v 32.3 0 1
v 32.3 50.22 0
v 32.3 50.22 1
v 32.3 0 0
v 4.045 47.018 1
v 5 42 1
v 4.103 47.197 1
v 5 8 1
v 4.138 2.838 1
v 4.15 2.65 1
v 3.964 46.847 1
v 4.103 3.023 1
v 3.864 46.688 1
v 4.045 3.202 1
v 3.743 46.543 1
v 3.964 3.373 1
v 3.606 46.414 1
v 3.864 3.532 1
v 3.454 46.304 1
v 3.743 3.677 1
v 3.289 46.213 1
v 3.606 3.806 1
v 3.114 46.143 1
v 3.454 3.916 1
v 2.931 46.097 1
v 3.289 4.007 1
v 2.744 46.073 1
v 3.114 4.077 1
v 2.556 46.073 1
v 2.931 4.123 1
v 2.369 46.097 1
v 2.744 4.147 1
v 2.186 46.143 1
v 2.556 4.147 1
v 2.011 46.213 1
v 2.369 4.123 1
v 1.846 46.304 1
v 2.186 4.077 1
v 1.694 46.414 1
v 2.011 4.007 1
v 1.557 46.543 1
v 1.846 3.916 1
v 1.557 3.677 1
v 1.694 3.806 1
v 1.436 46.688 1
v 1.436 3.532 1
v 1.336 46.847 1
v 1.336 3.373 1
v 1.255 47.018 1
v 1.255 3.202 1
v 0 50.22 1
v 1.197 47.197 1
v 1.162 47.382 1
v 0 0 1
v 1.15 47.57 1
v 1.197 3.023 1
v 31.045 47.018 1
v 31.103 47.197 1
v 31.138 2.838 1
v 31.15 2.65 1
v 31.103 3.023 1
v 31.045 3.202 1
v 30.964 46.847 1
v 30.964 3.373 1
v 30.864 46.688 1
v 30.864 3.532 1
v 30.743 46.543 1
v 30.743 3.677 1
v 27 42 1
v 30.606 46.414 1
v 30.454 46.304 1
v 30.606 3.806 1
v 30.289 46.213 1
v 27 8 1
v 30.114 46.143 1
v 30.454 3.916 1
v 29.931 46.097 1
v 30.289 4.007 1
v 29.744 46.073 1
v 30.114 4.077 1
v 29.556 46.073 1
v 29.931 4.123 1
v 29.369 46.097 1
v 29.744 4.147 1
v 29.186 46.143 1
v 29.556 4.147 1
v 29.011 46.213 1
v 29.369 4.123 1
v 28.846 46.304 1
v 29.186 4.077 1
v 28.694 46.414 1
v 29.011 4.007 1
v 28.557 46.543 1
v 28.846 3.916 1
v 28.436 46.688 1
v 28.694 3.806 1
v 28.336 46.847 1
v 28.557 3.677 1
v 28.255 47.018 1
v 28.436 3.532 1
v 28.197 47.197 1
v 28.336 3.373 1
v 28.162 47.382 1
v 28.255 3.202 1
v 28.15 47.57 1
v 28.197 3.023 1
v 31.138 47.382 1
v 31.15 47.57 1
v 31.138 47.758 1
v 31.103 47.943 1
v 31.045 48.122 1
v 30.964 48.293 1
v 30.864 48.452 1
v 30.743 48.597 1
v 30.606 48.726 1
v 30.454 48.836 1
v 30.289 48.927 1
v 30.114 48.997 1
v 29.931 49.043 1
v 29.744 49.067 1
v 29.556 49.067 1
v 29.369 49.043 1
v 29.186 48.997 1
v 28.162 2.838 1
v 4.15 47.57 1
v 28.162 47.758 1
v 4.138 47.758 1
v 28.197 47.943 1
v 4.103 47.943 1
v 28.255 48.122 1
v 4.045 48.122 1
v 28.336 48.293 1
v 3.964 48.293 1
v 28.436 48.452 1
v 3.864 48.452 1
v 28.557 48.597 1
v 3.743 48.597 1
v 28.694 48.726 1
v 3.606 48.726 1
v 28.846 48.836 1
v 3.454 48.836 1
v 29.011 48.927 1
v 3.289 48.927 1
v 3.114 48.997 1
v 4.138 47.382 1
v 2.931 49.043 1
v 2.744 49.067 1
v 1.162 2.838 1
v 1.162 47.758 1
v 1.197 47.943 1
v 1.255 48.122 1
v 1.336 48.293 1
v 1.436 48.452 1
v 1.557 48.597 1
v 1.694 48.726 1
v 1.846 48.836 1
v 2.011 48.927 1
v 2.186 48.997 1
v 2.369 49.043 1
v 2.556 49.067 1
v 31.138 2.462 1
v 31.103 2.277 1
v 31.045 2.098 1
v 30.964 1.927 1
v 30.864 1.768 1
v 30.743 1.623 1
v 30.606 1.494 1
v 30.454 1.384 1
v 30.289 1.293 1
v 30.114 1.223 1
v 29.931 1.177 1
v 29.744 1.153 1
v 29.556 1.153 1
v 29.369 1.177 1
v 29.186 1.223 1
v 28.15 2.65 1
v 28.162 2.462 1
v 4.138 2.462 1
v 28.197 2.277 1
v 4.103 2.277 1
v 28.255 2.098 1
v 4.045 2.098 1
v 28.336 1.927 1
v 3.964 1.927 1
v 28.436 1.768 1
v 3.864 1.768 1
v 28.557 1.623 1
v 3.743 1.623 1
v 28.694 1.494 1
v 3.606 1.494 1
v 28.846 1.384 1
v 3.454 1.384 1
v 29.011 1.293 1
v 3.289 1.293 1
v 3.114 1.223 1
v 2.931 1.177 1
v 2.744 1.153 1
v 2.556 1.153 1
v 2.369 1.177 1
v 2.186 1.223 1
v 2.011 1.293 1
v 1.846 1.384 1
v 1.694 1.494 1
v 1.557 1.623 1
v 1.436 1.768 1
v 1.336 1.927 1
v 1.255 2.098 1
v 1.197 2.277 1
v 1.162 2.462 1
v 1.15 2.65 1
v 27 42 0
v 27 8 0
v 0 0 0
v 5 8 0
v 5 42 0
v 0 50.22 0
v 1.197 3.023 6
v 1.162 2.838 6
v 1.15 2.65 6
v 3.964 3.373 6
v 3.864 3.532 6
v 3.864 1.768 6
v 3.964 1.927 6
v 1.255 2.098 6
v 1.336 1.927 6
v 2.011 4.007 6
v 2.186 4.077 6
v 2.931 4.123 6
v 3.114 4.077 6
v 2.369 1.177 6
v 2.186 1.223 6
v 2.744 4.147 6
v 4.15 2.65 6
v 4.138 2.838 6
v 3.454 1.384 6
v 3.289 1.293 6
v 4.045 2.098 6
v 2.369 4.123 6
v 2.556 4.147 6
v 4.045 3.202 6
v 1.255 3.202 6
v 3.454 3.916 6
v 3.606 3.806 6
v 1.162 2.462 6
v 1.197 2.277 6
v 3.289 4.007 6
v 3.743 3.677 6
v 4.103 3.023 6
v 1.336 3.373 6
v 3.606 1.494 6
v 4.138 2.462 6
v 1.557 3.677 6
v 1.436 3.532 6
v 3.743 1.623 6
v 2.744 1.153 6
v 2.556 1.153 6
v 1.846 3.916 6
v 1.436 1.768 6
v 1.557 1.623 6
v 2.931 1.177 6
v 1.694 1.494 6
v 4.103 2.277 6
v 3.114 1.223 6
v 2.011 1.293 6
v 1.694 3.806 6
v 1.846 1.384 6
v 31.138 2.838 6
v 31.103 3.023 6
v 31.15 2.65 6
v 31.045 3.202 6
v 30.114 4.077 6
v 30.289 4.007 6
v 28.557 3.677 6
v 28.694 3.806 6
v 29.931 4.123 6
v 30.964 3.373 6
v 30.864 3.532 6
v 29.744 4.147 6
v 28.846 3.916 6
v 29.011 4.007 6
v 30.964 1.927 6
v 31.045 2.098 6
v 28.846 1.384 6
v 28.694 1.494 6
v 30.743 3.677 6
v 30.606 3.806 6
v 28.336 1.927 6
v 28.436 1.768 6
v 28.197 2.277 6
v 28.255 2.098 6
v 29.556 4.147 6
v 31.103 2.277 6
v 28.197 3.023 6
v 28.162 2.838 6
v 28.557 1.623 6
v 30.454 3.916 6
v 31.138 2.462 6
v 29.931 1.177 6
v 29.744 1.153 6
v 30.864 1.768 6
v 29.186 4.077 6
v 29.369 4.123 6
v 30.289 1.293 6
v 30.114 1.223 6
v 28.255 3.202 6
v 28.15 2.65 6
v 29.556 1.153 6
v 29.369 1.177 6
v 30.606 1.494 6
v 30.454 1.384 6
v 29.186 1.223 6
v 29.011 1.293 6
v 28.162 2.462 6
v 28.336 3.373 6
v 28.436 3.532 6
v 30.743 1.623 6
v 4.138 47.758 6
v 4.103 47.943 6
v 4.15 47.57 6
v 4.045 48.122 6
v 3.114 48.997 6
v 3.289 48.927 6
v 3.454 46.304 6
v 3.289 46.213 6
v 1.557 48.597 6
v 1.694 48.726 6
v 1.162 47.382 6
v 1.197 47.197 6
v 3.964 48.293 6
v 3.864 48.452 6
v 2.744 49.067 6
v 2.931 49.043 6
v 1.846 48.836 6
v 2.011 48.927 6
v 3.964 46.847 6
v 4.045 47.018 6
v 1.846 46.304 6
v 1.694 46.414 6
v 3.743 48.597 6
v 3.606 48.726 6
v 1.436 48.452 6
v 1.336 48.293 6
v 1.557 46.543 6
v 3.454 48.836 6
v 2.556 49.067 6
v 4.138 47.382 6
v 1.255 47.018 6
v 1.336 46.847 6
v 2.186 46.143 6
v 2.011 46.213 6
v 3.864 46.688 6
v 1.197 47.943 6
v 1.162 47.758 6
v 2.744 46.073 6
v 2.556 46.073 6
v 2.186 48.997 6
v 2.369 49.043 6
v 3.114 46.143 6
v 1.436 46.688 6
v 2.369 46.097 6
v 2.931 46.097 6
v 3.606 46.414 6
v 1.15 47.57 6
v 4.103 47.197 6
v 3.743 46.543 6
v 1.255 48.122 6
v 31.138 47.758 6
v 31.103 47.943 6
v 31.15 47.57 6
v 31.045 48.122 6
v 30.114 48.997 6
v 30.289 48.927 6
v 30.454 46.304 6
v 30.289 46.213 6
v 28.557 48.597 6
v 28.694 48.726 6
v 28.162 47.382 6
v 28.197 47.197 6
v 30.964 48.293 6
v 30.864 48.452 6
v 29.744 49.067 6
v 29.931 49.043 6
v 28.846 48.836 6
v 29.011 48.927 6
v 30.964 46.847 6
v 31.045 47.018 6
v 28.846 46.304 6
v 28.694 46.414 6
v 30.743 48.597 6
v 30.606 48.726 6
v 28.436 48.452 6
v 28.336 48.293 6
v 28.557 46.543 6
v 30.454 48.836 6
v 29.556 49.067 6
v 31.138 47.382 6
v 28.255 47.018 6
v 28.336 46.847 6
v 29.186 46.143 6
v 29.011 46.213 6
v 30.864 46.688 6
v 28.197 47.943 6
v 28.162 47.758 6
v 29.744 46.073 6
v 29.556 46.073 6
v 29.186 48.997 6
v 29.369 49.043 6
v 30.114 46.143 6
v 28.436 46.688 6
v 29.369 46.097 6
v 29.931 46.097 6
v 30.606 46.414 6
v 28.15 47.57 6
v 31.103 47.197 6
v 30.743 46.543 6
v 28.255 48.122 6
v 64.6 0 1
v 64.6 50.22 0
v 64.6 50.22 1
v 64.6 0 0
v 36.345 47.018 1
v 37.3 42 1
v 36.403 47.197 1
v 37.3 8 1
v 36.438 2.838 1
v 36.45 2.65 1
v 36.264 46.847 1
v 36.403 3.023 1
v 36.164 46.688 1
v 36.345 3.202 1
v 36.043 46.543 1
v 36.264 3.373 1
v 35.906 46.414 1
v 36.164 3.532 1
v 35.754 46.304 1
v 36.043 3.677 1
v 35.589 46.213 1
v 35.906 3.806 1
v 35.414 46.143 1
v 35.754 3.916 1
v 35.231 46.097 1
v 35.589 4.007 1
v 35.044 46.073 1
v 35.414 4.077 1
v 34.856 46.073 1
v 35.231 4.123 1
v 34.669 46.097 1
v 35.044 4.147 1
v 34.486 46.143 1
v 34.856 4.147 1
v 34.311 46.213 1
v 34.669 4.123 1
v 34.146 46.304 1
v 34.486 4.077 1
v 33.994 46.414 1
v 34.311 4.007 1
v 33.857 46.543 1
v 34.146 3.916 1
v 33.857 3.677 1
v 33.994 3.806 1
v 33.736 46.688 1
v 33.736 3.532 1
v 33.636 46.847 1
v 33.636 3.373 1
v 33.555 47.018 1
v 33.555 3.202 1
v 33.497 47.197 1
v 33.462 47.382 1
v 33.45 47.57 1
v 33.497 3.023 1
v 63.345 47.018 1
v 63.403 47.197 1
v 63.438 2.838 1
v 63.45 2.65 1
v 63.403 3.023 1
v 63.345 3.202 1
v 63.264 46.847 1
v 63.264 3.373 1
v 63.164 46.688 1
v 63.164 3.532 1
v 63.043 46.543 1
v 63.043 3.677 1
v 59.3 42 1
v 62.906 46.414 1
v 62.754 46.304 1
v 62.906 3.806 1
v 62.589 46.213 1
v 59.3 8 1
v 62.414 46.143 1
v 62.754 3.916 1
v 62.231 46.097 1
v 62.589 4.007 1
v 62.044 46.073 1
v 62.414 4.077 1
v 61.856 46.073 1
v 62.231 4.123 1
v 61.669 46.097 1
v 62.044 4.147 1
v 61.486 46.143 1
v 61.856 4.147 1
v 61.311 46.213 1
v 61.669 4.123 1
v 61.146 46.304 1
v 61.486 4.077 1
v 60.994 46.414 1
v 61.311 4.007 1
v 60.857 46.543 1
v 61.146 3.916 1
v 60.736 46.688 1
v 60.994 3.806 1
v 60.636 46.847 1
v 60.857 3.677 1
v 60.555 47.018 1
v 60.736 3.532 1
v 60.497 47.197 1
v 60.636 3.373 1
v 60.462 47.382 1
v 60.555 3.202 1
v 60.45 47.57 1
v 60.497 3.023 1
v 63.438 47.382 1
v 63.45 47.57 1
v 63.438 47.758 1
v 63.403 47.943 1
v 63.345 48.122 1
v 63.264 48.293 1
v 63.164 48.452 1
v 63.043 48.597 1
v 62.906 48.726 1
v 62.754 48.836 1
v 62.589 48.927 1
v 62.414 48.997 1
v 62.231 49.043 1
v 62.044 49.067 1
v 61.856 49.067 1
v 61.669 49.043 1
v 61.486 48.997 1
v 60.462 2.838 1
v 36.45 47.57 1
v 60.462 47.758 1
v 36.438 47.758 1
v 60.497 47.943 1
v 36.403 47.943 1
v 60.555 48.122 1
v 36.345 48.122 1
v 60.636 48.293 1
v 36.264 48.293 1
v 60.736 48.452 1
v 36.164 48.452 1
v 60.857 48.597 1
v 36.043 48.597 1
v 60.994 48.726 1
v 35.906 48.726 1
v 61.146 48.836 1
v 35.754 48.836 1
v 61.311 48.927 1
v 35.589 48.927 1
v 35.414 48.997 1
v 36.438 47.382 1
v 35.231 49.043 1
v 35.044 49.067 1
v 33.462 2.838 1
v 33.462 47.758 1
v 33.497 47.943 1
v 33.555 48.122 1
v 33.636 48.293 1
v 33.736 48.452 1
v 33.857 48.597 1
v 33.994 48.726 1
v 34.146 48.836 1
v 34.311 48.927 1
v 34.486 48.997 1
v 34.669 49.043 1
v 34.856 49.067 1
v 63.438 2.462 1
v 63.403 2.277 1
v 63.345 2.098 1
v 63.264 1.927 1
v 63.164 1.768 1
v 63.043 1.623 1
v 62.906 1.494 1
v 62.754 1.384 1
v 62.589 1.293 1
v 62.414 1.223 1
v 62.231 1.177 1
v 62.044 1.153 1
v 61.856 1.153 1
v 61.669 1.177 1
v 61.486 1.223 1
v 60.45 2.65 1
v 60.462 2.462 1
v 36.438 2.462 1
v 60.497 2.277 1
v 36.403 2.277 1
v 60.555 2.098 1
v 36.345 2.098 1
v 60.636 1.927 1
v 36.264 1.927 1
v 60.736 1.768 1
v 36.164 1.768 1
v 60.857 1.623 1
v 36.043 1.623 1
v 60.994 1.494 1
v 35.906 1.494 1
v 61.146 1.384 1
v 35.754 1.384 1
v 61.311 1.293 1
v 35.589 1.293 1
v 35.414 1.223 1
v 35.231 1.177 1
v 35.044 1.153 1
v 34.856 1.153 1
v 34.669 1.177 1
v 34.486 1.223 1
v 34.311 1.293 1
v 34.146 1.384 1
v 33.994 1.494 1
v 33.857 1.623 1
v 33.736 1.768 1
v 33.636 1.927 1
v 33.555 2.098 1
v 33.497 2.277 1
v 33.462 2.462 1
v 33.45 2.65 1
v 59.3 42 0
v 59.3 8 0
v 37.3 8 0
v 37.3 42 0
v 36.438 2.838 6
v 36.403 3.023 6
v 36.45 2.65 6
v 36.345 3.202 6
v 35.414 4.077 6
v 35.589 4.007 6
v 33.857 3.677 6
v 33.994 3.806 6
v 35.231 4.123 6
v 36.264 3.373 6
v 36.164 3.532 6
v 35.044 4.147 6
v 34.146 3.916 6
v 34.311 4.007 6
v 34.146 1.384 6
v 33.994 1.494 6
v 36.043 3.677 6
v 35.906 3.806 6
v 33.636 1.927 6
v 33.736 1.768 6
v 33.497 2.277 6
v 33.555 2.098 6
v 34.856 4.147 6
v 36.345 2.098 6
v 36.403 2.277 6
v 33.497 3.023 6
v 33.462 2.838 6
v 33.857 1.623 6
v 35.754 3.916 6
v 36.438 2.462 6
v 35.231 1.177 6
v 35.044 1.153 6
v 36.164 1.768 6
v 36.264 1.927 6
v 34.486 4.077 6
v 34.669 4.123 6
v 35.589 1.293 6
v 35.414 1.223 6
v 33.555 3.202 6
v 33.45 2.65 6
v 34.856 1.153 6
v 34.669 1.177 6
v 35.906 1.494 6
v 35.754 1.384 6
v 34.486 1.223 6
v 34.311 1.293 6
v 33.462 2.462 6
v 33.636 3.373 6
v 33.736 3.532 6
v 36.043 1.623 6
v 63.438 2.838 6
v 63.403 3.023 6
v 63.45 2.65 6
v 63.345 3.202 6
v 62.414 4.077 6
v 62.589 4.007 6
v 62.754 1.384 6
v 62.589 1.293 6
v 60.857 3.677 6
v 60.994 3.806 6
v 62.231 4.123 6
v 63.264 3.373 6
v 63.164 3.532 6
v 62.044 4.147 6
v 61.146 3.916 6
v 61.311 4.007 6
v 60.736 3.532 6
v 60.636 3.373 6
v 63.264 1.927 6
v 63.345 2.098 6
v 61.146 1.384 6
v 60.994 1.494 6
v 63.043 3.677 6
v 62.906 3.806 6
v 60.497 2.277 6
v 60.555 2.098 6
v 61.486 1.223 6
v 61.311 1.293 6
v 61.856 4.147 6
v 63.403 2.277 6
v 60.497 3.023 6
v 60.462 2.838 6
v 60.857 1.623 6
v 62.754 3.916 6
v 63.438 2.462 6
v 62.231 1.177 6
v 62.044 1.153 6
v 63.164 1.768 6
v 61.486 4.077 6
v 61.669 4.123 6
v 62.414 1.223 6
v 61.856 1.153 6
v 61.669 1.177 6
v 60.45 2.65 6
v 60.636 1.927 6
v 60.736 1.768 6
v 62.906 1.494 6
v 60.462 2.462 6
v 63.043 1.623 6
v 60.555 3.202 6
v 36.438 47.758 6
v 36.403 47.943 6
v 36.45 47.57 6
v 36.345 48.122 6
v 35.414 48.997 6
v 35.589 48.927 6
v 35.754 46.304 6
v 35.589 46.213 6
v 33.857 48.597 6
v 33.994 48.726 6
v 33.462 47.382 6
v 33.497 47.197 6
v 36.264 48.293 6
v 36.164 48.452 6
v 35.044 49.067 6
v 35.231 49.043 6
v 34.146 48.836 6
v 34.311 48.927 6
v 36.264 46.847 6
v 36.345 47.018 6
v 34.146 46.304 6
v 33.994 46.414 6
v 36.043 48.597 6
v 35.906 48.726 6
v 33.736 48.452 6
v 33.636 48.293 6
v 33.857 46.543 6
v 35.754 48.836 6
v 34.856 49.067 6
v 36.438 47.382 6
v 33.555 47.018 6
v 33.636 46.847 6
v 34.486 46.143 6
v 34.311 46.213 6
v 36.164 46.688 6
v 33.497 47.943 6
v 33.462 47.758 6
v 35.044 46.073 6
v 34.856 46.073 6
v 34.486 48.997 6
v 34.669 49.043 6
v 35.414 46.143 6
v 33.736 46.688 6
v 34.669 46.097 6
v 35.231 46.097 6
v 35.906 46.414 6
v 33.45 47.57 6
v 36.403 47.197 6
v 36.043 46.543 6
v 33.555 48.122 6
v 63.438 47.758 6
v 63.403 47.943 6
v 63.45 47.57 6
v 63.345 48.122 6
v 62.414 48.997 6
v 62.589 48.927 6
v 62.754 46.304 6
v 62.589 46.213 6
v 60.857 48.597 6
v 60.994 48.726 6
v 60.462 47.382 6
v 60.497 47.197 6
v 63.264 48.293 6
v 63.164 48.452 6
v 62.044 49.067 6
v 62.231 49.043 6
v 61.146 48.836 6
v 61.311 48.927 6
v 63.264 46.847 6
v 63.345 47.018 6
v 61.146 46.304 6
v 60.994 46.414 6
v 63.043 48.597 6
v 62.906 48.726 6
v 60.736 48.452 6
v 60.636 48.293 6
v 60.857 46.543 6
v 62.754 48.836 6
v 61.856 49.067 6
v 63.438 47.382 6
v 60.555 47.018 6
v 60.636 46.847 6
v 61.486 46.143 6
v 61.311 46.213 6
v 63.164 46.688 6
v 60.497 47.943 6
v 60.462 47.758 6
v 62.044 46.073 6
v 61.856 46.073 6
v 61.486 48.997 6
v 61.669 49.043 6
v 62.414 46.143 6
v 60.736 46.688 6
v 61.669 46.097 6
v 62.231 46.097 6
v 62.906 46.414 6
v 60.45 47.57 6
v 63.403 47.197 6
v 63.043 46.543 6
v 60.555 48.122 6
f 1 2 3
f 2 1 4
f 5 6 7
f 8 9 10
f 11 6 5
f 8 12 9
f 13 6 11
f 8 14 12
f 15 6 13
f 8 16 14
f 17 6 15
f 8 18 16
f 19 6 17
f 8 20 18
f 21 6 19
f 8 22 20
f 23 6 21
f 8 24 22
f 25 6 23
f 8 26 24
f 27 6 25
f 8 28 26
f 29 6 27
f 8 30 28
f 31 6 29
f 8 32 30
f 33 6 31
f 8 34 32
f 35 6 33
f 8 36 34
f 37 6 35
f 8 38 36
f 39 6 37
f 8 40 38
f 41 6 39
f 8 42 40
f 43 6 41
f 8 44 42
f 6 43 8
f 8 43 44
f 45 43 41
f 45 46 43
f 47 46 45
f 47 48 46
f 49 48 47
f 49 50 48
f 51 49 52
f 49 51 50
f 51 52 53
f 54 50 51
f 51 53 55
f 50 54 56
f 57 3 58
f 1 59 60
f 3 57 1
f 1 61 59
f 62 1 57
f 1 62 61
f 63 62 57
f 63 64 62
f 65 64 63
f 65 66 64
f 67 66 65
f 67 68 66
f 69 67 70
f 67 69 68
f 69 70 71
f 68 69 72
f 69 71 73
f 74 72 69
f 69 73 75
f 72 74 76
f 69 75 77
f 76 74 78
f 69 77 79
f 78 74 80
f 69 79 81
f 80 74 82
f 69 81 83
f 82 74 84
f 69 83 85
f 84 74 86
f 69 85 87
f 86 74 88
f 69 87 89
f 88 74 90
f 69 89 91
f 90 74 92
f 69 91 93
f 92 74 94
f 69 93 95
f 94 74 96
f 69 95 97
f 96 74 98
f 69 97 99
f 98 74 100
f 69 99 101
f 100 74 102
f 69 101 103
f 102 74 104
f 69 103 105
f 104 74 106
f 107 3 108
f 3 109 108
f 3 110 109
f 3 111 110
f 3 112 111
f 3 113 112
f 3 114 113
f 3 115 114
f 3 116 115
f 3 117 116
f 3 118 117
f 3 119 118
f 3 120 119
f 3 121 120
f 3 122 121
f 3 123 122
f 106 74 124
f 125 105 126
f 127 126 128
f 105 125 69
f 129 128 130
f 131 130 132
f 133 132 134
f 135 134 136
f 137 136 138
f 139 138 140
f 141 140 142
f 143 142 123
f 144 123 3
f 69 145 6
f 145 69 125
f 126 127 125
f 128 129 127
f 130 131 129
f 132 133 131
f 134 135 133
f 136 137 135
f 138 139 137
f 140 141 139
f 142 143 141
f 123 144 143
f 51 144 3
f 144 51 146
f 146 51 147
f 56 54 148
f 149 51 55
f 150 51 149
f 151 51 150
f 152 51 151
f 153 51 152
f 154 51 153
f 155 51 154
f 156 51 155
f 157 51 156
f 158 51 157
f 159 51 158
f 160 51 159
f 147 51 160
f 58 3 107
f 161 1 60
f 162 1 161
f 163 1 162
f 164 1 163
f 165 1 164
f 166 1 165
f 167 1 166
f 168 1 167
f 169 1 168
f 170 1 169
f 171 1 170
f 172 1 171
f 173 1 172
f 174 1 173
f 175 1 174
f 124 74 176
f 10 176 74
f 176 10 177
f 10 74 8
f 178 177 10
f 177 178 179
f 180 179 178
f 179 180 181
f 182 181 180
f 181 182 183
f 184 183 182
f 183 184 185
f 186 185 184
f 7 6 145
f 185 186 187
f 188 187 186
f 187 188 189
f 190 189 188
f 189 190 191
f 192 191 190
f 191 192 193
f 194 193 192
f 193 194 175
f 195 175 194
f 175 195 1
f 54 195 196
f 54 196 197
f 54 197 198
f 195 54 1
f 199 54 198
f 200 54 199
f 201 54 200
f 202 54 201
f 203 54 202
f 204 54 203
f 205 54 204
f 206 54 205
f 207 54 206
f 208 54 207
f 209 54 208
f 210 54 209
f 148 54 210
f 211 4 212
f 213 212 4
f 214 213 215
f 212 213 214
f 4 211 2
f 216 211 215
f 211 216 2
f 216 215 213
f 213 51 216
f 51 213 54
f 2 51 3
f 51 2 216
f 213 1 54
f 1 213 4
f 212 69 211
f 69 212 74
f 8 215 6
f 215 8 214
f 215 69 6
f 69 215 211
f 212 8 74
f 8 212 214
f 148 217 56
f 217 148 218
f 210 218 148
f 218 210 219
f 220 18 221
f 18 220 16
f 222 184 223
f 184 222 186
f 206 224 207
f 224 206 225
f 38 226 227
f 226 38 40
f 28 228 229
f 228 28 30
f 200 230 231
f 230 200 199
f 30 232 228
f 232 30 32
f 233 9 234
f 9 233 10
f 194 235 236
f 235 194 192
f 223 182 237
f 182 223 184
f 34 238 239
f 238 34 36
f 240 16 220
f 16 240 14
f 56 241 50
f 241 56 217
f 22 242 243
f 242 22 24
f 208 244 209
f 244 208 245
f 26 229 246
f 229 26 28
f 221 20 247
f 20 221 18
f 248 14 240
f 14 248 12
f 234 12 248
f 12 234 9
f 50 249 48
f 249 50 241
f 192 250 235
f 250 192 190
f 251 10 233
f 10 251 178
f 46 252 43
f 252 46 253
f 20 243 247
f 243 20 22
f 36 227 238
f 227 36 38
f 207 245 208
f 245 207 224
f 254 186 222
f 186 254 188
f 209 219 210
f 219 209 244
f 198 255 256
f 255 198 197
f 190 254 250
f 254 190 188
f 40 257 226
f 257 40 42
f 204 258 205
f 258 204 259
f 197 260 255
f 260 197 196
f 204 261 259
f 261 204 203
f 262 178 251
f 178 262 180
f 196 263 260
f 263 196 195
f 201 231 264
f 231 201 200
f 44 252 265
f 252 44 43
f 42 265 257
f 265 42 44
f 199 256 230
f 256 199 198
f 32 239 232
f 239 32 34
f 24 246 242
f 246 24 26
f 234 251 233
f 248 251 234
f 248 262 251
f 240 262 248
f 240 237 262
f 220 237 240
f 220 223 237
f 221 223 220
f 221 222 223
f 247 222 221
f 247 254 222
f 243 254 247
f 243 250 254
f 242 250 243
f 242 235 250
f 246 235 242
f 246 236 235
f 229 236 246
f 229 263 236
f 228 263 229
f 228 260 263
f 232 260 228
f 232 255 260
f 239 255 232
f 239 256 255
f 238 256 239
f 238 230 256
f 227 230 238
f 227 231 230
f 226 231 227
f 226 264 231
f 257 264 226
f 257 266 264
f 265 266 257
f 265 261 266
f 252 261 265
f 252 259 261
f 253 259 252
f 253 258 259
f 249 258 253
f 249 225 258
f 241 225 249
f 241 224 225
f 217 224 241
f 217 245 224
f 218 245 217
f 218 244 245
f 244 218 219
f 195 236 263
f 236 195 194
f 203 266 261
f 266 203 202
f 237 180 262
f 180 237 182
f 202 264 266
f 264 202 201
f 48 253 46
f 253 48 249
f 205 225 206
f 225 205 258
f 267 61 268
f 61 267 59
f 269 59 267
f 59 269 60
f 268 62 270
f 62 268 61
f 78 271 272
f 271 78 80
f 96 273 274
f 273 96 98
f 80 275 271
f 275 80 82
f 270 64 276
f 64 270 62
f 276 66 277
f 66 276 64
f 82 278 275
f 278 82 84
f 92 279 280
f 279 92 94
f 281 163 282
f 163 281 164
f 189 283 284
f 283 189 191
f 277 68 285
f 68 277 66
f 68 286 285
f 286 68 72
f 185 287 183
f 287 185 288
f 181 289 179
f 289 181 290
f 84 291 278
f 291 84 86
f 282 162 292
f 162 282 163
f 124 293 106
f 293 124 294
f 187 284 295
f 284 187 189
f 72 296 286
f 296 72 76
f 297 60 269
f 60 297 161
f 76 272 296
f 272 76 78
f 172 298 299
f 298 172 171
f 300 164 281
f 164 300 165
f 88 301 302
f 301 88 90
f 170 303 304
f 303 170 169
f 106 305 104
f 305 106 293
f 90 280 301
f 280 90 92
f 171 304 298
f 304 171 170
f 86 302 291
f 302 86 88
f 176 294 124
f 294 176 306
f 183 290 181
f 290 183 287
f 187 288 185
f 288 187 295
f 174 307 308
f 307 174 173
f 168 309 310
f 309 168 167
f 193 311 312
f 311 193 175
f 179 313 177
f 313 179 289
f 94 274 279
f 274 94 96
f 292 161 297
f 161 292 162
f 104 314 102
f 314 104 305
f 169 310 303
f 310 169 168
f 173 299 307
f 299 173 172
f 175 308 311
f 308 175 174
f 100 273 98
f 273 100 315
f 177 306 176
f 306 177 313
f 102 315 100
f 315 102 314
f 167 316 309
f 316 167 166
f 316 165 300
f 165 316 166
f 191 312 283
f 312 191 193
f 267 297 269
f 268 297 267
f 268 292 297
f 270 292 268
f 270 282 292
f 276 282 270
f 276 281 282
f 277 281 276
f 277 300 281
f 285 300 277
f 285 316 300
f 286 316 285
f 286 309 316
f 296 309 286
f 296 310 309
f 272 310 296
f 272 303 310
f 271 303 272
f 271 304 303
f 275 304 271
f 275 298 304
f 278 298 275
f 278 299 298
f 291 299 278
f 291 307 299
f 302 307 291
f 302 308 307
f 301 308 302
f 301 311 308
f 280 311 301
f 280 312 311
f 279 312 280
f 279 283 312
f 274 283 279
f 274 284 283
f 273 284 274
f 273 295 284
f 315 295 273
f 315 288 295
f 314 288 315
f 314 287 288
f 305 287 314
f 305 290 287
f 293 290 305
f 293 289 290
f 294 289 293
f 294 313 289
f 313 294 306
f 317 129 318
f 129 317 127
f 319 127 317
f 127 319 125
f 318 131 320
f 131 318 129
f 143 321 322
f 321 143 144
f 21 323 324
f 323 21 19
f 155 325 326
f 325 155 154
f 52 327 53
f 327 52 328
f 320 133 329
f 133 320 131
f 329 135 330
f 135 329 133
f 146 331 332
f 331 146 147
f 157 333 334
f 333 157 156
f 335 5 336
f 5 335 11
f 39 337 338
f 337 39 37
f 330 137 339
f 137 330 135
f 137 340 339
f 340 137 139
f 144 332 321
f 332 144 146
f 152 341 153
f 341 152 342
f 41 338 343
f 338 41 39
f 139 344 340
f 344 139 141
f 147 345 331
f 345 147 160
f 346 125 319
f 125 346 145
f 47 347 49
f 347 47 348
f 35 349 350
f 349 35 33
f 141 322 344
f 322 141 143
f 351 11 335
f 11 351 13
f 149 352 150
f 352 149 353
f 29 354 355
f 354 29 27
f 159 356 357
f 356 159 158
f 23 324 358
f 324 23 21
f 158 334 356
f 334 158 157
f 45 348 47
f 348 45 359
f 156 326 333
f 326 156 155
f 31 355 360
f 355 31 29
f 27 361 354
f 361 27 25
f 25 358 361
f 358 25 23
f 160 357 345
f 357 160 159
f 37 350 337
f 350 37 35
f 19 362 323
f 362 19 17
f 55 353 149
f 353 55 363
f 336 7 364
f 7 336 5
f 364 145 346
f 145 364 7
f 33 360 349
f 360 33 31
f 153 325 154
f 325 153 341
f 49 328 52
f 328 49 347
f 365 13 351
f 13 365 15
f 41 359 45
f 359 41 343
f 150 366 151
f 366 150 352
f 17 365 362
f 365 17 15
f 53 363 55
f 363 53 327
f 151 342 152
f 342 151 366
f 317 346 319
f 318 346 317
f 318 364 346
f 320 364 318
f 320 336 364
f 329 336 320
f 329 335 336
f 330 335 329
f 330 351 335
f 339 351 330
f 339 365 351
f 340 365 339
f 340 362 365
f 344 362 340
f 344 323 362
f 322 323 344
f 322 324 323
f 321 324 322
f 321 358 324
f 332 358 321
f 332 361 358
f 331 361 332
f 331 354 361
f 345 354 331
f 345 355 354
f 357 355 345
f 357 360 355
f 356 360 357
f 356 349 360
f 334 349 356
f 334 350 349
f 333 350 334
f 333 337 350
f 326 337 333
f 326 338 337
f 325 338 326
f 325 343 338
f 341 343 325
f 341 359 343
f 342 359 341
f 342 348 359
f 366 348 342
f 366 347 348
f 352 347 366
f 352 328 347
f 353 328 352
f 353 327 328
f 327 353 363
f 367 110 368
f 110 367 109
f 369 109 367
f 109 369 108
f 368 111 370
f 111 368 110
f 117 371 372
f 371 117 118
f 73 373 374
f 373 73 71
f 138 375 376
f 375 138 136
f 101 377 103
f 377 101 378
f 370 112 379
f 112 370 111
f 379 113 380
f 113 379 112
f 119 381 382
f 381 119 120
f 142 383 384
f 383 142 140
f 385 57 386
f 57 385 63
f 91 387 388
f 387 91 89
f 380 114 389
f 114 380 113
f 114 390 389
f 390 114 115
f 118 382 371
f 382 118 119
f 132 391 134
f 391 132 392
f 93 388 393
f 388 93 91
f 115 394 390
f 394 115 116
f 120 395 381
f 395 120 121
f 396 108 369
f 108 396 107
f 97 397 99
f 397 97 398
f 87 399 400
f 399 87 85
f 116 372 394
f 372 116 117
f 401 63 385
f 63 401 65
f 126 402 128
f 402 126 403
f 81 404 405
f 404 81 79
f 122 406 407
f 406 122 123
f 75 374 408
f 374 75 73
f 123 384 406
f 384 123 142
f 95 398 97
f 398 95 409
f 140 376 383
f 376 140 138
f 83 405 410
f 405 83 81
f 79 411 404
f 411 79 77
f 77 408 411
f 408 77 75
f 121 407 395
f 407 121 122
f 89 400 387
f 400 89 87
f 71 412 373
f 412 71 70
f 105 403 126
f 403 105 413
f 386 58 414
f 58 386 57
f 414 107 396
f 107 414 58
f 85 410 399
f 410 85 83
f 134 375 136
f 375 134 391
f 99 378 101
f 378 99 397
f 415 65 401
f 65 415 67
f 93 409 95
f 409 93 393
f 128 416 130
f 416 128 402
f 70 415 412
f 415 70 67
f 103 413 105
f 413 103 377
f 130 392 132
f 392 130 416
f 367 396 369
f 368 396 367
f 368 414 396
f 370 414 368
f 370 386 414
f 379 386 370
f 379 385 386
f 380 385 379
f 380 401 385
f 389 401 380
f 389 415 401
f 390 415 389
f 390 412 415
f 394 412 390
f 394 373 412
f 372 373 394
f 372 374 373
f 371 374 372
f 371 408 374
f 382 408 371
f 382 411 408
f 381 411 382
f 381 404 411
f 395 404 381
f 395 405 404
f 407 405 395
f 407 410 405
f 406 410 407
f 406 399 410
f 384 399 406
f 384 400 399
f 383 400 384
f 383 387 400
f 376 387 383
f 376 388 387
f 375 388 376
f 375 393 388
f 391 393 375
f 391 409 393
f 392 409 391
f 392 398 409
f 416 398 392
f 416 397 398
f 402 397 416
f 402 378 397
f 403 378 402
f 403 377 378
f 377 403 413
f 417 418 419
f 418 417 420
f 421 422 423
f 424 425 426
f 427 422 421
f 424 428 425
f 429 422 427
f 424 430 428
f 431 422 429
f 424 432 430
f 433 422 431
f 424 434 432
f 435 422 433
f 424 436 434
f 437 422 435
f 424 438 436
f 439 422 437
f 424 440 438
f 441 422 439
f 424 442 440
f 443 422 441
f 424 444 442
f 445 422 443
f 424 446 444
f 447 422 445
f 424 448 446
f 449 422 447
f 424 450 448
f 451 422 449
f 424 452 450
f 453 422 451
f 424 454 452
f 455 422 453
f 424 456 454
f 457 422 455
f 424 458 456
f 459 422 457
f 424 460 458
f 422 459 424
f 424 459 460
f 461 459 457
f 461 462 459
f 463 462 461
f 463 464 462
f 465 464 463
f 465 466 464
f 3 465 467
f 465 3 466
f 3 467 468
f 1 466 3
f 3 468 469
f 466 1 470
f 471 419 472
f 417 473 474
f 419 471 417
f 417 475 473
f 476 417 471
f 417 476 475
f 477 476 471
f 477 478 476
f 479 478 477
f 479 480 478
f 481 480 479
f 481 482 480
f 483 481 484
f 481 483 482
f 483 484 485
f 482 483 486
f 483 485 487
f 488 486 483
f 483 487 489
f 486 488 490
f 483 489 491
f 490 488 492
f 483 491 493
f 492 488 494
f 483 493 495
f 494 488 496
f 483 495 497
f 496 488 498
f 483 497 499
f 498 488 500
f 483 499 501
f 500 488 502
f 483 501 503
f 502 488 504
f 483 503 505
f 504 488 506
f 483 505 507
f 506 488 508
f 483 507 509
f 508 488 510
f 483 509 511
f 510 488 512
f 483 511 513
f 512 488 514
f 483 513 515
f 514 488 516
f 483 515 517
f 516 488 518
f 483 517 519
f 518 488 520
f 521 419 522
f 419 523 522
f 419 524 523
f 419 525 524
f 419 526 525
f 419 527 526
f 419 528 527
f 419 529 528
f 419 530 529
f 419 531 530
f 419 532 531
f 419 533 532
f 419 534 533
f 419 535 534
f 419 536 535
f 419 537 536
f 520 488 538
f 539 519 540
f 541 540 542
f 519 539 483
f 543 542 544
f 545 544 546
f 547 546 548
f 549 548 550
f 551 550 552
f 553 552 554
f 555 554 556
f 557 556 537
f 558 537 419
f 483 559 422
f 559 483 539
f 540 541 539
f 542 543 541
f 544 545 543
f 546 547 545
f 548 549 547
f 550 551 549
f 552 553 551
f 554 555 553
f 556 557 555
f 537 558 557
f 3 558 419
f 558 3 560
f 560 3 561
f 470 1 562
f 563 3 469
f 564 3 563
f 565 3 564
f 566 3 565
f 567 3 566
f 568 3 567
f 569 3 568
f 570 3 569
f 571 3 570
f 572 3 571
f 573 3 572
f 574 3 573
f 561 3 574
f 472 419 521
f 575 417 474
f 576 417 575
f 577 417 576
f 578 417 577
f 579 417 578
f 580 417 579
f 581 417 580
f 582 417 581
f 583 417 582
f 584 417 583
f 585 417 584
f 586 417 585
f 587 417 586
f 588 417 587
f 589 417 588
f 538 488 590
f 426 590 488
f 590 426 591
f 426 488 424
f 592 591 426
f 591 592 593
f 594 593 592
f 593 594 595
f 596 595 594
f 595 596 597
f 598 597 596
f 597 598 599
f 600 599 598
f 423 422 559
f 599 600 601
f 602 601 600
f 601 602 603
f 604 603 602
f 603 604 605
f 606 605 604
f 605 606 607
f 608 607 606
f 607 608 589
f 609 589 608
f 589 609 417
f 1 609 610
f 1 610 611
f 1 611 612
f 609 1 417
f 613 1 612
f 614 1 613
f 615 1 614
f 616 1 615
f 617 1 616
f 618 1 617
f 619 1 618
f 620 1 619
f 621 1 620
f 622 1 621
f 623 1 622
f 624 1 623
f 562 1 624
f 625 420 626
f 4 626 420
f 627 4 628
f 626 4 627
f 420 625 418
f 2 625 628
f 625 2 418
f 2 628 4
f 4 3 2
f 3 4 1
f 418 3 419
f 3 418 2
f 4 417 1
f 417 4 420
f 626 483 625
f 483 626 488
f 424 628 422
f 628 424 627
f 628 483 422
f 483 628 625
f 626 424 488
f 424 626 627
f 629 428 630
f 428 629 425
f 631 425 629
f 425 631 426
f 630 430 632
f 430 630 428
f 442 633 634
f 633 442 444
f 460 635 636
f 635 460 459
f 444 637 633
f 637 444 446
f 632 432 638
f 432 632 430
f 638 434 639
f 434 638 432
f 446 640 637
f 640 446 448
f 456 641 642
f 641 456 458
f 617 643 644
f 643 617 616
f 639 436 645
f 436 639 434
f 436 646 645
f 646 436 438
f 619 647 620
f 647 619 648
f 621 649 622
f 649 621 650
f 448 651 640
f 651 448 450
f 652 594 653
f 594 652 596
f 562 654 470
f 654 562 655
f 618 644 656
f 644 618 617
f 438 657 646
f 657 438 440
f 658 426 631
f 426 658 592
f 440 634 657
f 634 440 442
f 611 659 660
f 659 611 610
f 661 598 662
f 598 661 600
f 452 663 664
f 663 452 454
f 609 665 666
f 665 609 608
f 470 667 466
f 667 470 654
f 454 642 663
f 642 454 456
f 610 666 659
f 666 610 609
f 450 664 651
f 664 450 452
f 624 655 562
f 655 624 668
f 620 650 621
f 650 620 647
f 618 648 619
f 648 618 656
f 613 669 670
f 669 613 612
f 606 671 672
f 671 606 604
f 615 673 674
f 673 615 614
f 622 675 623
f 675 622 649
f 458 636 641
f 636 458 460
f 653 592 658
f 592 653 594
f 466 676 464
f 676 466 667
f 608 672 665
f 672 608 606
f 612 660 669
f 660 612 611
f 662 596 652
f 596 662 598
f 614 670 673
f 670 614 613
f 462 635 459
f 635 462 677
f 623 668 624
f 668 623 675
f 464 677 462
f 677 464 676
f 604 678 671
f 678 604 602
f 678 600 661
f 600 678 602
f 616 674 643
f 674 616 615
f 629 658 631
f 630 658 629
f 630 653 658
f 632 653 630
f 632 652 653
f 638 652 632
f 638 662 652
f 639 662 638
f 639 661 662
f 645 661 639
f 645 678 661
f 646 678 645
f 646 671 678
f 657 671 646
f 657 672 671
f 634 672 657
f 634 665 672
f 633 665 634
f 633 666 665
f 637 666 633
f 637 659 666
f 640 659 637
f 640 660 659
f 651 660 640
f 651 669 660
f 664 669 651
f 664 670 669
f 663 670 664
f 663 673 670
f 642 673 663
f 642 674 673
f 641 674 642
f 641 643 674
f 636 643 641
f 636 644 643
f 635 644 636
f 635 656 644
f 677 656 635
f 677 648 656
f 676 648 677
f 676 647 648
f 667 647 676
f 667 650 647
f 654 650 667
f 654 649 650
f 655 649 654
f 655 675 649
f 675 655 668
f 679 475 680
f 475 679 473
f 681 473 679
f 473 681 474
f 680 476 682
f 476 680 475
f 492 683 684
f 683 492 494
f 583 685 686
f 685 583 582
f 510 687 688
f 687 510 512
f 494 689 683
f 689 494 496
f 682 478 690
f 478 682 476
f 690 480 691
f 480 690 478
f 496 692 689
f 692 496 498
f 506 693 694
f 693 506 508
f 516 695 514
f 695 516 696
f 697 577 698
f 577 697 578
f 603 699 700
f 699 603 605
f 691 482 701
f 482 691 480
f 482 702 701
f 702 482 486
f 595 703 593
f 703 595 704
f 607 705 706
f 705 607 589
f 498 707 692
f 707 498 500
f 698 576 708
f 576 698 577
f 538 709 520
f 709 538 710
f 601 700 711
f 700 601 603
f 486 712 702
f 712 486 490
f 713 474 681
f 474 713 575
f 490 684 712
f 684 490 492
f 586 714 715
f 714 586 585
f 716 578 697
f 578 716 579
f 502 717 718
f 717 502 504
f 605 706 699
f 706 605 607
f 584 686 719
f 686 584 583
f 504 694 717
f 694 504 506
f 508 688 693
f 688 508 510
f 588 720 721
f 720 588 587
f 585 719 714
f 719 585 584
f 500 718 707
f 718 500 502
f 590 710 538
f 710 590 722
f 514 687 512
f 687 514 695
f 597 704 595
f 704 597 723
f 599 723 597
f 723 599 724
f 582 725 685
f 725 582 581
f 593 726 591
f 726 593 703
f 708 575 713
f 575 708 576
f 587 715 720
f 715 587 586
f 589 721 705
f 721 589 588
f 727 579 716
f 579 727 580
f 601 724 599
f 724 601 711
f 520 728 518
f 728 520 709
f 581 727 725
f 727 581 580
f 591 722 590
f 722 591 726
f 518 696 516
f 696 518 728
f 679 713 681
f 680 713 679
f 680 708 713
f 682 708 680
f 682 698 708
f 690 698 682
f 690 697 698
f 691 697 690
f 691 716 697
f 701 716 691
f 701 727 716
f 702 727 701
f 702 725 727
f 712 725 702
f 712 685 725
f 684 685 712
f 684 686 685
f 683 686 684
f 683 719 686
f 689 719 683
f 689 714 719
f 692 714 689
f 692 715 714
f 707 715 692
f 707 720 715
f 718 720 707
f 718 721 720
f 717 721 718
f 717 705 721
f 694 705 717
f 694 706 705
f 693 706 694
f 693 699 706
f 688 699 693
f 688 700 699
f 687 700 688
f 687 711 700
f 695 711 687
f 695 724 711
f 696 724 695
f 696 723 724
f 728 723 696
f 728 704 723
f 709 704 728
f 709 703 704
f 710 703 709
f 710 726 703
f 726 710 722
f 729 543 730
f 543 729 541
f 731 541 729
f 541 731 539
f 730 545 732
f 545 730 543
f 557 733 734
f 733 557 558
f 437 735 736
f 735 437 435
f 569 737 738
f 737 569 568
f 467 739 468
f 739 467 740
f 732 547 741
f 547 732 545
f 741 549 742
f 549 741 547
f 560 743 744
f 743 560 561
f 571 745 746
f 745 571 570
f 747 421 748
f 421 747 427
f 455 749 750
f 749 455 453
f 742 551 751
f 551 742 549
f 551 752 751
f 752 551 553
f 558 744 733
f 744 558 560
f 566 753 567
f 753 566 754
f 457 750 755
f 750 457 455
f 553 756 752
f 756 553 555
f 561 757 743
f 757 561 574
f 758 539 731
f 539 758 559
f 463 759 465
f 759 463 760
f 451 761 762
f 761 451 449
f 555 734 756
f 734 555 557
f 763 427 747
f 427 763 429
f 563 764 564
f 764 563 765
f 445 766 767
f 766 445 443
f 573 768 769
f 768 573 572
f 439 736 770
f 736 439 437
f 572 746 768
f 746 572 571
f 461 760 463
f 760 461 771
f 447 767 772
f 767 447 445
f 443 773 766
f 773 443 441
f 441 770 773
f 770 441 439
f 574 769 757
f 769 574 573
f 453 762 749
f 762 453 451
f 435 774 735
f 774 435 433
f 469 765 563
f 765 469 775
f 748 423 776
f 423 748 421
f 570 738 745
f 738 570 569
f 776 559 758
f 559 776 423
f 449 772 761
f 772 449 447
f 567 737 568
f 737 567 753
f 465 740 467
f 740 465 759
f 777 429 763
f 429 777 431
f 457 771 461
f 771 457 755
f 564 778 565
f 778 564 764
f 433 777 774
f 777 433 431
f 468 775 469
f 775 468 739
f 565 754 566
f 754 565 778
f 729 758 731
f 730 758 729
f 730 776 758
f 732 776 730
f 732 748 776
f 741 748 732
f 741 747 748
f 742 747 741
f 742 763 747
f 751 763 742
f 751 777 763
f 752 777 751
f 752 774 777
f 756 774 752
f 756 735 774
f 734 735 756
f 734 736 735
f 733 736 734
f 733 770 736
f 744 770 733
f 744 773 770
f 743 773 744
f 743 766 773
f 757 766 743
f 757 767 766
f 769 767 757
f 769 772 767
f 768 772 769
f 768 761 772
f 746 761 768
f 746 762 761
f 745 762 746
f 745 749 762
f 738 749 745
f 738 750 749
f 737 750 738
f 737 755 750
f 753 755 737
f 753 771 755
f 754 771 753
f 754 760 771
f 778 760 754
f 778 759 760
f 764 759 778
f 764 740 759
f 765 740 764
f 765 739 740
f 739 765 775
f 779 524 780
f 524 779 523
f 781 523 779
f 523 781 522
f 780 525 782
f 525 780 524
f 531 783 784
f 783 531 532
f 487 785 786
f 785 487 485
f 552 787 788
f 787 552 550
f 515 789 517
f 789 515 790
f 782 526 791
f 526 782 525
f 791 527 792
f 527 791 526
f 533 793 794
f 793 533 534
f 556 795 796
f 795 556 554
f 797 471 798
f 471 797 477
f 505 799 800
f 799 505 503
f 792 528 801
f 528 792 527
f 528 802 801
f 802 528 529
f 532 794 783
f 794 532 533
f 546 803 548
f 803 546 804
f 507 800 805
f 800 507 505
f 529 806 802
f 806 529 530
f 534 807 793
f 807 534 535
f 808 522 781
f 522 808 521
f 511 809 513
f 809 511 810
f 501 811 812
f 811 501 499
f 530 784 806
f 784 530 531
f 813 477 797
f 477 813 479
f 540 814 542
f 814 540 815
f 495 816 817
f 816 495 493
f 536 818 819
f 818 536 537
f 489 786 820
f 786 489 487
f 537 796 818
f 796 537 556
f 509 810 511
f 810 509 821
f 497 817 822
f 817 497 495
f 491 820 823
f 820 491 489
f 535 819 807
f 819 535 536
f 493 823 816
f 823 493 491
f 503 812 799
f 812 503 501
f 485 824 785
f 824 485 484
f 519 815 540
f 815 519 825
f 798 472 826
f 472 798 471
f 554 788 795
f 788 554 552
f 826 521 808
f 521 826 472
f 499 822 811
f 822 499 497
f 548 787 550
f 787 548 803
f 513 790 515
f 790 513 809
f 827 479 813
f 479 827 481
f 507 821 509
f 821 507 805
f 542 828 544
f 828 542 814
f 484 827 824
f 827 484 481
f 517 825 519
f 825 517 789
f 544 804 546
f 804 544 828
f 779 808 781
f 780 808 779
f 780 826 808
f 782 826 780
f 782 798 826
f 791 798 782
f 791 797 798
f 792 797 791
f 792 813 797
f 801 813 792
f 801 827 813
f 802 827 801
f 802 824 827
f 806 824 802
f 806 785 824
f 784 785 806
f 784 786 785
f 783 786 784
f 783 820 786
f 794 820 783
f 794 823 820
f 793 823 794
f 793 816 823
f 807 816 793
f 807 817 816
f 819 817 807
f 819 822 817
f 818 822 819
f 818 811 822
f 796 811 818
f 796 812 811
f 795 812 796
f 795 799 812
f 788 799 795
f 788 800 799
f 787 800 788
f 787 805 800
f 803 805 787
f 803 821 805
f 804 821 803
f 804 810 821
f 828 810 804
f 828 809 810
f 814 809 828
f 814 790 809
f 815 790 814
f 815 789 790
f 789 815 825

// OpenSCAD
//#cube([31.82, 31.82, 7.13]);
base_width = 32.3;
base_height = 50.22;
hole_radius = 1.5;
d_edge_to_center_of_holes = 1.15 + hole_radius;
pin_height = 6;
for(i = [0 : 1]) {
    translate([i*base_width, 0, 0]) {
difference() {
    cube([base_width, base_height, 1]);
    translate([5, 8, -1]) {cube([22, 34, 3]);}
}

// bl
translate([d_edge_to_center_of_holes, d_edge_to_center_of_holes, 0]) {cylinder(pin_height, hole_radius, hole_radius, $fn=50);}
// br
translate([base_width - d_edge_to_center_of_holes, d_edge_to_center_of_holes, 0]) {cylinder(pin_height, hole_radius, hole_radius, $fn=50);}
// tl
translate([d_edge_to_center_of_holes, base_height - d_edge_to_center_of_holes, 0]) {cylinder(pin_height, hole_radius, hole_radius, $fn=50);}
// tr
translate([base_width - d_edge_to_center_of_holes, base_height - d_edge_to_center_of_holes, 0]) {cylinder(pin_height, hole_radius, hole_radius, $fn=50);}
}
}
